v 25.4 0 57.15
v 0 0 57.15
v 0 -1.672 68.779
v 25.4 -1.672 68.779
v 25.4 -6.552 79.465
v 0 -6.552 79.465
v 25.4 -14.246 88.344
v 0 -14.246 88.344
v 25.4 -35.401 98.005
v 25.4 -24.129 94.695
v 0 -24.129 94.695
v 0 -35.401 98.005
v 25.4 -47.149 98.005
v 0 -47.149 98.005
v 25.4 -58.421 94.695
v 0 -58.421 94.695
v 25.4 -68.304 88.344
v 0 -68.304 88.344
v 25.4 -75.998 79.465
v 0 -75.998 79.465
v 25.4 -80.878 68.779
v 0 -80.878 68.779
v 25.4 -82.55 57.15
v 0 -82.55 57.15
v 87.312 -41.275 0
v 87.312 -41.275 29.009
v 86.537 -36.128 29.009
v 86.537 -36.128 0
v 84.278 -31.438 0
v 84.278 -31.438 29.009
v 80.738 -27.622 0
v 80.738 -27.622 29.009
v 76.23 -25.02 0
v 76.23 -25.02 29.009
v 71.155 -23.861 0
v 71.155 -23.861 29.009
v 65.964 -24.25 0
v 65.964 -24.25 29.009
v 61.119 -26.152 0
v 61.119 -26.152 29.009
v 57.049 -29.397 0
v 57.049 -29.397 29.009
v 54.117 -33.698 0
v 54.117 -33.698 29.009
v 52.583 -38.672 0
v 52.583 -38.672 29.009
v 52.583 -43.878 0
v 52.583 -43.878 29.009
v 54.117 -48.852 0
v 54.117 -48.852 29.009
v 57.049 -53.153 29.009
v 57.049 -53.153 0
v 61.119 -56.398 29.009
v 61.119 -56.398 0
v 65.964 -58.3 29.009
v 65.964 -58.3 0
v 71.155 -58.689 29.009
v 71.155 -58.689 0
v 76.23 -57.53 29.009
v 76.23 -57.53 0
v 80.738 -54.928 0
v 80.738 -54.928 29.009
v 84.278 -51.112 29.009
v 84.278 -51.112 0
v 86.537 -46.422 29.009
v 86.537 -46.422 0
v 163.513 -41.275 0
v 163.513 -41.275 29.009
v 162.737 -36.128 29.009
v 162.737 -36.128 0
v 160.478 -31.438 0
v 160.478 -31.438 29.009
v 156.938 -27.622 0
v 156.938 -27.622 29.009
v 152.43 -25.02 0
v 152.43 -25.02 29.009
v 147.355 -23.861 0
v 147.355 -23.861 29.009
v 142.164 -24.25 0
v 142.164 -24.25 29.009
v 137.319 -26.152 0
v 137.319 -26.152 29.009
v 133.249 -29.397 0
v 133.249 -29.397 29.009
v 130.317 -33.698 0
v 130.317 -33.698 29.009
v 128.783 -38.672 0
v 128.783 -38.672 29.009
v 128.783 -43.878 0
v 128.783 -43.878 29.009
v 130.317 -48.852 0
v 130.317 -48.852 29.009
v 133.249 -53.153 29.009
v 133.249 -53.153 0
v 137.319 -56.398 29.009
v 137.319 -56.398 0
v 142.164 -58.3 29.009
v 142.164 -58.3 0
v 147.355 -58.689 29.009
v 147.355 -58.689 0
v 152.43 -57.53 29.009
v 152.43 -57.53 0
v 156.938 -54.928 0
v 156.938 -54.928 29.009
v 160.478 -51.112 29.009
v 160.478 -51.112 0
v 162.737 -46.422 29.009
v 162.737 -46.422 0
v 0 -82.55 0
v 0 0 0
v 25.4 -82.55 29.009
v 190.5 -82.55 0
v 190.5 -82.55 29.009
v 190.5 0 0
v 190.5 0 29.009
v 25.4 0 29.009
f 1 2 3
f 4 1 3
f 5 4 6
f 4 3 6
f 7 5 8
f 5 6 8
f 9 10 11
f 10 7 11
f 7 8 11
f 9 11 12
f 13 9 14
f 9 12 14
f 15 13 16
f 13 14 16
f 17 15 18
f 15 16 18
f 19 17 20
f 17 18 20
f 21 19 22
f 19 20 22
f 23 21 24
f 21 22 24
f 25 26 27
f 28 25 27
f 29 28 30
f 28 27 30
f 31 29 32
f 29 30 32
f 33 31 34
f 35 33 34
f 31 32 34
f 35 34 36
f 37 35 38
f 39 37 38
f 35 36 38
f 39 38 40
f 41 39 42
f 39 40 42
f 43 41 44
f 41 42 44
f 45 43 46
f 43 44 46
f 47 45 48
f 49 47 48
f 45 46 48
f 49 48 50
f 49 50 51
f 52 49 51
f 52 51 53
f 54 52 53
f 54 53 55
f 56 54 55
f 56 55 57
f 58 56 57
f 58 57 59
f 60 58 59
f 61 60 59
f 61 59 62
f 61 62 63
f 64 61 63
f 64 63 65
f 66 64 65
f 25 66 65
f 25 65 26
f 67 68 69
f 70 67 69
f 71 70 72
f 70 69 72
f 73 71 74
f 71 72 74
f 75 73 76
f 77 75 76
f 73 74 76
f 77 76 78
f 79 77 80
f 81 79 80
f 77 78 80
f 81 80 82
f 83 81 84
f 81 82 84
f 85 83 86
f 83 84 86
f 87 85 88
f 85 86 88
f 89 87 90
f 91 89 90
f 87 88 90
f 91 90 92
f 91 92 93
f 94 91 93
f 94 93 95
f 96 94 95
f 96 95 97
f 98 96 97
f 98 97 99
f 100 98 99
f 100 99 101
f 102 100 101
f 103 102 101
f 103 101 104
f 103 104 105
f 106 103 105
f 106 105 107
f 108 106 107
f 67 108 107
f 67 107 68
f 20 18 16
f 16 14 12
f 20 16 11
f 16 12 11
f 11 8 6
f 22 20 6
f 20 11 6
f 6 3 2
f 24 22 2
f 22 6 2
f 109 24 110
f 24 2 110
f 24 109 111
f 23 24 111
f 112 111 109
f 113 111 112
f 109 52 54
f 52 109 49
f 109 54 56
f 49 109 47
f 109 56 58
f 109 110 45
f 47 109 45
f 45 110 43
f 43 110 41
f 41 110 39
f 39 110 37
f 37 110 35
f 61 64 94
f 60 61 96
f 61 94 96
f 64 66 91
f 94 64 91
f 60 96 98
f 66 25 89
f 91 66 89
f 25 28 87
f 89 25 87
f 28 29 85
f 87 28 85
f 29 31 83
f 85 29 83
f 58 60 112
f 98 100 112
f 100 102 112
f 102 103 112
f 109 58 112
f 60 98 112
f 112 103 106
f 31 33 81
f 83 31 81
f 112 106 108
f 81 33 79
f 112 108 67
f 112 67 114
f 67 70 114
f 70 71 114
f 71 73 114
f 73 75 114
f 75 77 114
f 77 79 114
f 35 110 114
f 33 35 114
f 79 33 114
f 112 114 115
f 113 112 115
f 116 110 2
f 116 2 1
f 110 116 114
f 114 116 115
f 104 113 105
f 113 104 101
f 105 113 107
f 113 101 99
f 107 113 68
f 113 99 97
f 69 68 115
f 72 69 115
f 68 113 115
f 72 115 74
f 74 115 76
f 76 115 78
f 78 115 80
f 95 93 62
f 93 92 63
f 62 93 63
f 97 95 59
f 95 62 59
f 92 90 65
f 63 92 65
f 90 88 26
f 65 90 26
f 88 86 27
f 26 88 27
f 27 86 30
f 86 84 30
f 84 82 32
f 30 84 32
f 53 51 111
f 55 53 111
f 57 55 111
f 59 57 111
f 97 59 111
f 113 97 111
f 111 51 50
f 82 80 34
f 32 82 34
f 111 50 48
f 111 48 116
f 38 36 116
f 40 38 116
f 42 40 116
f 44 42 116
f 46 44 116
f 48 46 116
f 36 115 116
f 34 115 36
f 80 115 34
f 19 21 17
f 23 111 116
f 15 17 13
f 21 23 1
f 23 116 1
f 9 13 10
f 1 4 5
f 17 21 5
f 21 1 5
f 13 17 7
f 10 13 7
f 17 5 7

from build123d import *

# Parameters (mm, degrees)
F1_DEPTH = 82.55
F3_DEPTH = 190.501
F4_R     = 17.4625
F5_DEPTH = 29.01032


with BuildPart() as f1:
    # F0 (on Front) → F1 (new body)
    with BuildSketch(Plane.XZ):
        Polygon((0, 101.6), (0, 0), (190.5, 0), (190.5, 29.00932), (25.4, 29.00932), (25.4, 101.6), align=None)
    extrude(amount=F1_DEPTH)

    # F2 (on face) → F3 (cut, through all)
    with BuildSketch(Plane(origin=(0, 0, 0), x_dir=(0, -1, 0), z_dir=(-1, 0, 0))):
        with BuildLine():
            Line((0, 101.6), (0, 57.15))
            ThreePointArc((0, 57.15), (41.275, 98.425), (82.55, 57.15))
            Line((82.55, 57.15), (82.55, 101.6))
            Line((82.55, 101.6), (0, 101.6))
        make_face()
    extrude(amount=-F3_DEPTH, mode=Mode.SUBTRACT)

    # F4 (on face) → F5 (cut, through all)
    with BuildSketch(Plane.XY.offset(29.00932)):
        with Locations((69.85, -41.275)):
            Circle(F4_R)
        with Locations((146.05, -41.275)):
            Circle(F4_R)
    extrude(amount=-F5_DEPTH, mode=Mode.SUBTRACT)


solid = f1.part
